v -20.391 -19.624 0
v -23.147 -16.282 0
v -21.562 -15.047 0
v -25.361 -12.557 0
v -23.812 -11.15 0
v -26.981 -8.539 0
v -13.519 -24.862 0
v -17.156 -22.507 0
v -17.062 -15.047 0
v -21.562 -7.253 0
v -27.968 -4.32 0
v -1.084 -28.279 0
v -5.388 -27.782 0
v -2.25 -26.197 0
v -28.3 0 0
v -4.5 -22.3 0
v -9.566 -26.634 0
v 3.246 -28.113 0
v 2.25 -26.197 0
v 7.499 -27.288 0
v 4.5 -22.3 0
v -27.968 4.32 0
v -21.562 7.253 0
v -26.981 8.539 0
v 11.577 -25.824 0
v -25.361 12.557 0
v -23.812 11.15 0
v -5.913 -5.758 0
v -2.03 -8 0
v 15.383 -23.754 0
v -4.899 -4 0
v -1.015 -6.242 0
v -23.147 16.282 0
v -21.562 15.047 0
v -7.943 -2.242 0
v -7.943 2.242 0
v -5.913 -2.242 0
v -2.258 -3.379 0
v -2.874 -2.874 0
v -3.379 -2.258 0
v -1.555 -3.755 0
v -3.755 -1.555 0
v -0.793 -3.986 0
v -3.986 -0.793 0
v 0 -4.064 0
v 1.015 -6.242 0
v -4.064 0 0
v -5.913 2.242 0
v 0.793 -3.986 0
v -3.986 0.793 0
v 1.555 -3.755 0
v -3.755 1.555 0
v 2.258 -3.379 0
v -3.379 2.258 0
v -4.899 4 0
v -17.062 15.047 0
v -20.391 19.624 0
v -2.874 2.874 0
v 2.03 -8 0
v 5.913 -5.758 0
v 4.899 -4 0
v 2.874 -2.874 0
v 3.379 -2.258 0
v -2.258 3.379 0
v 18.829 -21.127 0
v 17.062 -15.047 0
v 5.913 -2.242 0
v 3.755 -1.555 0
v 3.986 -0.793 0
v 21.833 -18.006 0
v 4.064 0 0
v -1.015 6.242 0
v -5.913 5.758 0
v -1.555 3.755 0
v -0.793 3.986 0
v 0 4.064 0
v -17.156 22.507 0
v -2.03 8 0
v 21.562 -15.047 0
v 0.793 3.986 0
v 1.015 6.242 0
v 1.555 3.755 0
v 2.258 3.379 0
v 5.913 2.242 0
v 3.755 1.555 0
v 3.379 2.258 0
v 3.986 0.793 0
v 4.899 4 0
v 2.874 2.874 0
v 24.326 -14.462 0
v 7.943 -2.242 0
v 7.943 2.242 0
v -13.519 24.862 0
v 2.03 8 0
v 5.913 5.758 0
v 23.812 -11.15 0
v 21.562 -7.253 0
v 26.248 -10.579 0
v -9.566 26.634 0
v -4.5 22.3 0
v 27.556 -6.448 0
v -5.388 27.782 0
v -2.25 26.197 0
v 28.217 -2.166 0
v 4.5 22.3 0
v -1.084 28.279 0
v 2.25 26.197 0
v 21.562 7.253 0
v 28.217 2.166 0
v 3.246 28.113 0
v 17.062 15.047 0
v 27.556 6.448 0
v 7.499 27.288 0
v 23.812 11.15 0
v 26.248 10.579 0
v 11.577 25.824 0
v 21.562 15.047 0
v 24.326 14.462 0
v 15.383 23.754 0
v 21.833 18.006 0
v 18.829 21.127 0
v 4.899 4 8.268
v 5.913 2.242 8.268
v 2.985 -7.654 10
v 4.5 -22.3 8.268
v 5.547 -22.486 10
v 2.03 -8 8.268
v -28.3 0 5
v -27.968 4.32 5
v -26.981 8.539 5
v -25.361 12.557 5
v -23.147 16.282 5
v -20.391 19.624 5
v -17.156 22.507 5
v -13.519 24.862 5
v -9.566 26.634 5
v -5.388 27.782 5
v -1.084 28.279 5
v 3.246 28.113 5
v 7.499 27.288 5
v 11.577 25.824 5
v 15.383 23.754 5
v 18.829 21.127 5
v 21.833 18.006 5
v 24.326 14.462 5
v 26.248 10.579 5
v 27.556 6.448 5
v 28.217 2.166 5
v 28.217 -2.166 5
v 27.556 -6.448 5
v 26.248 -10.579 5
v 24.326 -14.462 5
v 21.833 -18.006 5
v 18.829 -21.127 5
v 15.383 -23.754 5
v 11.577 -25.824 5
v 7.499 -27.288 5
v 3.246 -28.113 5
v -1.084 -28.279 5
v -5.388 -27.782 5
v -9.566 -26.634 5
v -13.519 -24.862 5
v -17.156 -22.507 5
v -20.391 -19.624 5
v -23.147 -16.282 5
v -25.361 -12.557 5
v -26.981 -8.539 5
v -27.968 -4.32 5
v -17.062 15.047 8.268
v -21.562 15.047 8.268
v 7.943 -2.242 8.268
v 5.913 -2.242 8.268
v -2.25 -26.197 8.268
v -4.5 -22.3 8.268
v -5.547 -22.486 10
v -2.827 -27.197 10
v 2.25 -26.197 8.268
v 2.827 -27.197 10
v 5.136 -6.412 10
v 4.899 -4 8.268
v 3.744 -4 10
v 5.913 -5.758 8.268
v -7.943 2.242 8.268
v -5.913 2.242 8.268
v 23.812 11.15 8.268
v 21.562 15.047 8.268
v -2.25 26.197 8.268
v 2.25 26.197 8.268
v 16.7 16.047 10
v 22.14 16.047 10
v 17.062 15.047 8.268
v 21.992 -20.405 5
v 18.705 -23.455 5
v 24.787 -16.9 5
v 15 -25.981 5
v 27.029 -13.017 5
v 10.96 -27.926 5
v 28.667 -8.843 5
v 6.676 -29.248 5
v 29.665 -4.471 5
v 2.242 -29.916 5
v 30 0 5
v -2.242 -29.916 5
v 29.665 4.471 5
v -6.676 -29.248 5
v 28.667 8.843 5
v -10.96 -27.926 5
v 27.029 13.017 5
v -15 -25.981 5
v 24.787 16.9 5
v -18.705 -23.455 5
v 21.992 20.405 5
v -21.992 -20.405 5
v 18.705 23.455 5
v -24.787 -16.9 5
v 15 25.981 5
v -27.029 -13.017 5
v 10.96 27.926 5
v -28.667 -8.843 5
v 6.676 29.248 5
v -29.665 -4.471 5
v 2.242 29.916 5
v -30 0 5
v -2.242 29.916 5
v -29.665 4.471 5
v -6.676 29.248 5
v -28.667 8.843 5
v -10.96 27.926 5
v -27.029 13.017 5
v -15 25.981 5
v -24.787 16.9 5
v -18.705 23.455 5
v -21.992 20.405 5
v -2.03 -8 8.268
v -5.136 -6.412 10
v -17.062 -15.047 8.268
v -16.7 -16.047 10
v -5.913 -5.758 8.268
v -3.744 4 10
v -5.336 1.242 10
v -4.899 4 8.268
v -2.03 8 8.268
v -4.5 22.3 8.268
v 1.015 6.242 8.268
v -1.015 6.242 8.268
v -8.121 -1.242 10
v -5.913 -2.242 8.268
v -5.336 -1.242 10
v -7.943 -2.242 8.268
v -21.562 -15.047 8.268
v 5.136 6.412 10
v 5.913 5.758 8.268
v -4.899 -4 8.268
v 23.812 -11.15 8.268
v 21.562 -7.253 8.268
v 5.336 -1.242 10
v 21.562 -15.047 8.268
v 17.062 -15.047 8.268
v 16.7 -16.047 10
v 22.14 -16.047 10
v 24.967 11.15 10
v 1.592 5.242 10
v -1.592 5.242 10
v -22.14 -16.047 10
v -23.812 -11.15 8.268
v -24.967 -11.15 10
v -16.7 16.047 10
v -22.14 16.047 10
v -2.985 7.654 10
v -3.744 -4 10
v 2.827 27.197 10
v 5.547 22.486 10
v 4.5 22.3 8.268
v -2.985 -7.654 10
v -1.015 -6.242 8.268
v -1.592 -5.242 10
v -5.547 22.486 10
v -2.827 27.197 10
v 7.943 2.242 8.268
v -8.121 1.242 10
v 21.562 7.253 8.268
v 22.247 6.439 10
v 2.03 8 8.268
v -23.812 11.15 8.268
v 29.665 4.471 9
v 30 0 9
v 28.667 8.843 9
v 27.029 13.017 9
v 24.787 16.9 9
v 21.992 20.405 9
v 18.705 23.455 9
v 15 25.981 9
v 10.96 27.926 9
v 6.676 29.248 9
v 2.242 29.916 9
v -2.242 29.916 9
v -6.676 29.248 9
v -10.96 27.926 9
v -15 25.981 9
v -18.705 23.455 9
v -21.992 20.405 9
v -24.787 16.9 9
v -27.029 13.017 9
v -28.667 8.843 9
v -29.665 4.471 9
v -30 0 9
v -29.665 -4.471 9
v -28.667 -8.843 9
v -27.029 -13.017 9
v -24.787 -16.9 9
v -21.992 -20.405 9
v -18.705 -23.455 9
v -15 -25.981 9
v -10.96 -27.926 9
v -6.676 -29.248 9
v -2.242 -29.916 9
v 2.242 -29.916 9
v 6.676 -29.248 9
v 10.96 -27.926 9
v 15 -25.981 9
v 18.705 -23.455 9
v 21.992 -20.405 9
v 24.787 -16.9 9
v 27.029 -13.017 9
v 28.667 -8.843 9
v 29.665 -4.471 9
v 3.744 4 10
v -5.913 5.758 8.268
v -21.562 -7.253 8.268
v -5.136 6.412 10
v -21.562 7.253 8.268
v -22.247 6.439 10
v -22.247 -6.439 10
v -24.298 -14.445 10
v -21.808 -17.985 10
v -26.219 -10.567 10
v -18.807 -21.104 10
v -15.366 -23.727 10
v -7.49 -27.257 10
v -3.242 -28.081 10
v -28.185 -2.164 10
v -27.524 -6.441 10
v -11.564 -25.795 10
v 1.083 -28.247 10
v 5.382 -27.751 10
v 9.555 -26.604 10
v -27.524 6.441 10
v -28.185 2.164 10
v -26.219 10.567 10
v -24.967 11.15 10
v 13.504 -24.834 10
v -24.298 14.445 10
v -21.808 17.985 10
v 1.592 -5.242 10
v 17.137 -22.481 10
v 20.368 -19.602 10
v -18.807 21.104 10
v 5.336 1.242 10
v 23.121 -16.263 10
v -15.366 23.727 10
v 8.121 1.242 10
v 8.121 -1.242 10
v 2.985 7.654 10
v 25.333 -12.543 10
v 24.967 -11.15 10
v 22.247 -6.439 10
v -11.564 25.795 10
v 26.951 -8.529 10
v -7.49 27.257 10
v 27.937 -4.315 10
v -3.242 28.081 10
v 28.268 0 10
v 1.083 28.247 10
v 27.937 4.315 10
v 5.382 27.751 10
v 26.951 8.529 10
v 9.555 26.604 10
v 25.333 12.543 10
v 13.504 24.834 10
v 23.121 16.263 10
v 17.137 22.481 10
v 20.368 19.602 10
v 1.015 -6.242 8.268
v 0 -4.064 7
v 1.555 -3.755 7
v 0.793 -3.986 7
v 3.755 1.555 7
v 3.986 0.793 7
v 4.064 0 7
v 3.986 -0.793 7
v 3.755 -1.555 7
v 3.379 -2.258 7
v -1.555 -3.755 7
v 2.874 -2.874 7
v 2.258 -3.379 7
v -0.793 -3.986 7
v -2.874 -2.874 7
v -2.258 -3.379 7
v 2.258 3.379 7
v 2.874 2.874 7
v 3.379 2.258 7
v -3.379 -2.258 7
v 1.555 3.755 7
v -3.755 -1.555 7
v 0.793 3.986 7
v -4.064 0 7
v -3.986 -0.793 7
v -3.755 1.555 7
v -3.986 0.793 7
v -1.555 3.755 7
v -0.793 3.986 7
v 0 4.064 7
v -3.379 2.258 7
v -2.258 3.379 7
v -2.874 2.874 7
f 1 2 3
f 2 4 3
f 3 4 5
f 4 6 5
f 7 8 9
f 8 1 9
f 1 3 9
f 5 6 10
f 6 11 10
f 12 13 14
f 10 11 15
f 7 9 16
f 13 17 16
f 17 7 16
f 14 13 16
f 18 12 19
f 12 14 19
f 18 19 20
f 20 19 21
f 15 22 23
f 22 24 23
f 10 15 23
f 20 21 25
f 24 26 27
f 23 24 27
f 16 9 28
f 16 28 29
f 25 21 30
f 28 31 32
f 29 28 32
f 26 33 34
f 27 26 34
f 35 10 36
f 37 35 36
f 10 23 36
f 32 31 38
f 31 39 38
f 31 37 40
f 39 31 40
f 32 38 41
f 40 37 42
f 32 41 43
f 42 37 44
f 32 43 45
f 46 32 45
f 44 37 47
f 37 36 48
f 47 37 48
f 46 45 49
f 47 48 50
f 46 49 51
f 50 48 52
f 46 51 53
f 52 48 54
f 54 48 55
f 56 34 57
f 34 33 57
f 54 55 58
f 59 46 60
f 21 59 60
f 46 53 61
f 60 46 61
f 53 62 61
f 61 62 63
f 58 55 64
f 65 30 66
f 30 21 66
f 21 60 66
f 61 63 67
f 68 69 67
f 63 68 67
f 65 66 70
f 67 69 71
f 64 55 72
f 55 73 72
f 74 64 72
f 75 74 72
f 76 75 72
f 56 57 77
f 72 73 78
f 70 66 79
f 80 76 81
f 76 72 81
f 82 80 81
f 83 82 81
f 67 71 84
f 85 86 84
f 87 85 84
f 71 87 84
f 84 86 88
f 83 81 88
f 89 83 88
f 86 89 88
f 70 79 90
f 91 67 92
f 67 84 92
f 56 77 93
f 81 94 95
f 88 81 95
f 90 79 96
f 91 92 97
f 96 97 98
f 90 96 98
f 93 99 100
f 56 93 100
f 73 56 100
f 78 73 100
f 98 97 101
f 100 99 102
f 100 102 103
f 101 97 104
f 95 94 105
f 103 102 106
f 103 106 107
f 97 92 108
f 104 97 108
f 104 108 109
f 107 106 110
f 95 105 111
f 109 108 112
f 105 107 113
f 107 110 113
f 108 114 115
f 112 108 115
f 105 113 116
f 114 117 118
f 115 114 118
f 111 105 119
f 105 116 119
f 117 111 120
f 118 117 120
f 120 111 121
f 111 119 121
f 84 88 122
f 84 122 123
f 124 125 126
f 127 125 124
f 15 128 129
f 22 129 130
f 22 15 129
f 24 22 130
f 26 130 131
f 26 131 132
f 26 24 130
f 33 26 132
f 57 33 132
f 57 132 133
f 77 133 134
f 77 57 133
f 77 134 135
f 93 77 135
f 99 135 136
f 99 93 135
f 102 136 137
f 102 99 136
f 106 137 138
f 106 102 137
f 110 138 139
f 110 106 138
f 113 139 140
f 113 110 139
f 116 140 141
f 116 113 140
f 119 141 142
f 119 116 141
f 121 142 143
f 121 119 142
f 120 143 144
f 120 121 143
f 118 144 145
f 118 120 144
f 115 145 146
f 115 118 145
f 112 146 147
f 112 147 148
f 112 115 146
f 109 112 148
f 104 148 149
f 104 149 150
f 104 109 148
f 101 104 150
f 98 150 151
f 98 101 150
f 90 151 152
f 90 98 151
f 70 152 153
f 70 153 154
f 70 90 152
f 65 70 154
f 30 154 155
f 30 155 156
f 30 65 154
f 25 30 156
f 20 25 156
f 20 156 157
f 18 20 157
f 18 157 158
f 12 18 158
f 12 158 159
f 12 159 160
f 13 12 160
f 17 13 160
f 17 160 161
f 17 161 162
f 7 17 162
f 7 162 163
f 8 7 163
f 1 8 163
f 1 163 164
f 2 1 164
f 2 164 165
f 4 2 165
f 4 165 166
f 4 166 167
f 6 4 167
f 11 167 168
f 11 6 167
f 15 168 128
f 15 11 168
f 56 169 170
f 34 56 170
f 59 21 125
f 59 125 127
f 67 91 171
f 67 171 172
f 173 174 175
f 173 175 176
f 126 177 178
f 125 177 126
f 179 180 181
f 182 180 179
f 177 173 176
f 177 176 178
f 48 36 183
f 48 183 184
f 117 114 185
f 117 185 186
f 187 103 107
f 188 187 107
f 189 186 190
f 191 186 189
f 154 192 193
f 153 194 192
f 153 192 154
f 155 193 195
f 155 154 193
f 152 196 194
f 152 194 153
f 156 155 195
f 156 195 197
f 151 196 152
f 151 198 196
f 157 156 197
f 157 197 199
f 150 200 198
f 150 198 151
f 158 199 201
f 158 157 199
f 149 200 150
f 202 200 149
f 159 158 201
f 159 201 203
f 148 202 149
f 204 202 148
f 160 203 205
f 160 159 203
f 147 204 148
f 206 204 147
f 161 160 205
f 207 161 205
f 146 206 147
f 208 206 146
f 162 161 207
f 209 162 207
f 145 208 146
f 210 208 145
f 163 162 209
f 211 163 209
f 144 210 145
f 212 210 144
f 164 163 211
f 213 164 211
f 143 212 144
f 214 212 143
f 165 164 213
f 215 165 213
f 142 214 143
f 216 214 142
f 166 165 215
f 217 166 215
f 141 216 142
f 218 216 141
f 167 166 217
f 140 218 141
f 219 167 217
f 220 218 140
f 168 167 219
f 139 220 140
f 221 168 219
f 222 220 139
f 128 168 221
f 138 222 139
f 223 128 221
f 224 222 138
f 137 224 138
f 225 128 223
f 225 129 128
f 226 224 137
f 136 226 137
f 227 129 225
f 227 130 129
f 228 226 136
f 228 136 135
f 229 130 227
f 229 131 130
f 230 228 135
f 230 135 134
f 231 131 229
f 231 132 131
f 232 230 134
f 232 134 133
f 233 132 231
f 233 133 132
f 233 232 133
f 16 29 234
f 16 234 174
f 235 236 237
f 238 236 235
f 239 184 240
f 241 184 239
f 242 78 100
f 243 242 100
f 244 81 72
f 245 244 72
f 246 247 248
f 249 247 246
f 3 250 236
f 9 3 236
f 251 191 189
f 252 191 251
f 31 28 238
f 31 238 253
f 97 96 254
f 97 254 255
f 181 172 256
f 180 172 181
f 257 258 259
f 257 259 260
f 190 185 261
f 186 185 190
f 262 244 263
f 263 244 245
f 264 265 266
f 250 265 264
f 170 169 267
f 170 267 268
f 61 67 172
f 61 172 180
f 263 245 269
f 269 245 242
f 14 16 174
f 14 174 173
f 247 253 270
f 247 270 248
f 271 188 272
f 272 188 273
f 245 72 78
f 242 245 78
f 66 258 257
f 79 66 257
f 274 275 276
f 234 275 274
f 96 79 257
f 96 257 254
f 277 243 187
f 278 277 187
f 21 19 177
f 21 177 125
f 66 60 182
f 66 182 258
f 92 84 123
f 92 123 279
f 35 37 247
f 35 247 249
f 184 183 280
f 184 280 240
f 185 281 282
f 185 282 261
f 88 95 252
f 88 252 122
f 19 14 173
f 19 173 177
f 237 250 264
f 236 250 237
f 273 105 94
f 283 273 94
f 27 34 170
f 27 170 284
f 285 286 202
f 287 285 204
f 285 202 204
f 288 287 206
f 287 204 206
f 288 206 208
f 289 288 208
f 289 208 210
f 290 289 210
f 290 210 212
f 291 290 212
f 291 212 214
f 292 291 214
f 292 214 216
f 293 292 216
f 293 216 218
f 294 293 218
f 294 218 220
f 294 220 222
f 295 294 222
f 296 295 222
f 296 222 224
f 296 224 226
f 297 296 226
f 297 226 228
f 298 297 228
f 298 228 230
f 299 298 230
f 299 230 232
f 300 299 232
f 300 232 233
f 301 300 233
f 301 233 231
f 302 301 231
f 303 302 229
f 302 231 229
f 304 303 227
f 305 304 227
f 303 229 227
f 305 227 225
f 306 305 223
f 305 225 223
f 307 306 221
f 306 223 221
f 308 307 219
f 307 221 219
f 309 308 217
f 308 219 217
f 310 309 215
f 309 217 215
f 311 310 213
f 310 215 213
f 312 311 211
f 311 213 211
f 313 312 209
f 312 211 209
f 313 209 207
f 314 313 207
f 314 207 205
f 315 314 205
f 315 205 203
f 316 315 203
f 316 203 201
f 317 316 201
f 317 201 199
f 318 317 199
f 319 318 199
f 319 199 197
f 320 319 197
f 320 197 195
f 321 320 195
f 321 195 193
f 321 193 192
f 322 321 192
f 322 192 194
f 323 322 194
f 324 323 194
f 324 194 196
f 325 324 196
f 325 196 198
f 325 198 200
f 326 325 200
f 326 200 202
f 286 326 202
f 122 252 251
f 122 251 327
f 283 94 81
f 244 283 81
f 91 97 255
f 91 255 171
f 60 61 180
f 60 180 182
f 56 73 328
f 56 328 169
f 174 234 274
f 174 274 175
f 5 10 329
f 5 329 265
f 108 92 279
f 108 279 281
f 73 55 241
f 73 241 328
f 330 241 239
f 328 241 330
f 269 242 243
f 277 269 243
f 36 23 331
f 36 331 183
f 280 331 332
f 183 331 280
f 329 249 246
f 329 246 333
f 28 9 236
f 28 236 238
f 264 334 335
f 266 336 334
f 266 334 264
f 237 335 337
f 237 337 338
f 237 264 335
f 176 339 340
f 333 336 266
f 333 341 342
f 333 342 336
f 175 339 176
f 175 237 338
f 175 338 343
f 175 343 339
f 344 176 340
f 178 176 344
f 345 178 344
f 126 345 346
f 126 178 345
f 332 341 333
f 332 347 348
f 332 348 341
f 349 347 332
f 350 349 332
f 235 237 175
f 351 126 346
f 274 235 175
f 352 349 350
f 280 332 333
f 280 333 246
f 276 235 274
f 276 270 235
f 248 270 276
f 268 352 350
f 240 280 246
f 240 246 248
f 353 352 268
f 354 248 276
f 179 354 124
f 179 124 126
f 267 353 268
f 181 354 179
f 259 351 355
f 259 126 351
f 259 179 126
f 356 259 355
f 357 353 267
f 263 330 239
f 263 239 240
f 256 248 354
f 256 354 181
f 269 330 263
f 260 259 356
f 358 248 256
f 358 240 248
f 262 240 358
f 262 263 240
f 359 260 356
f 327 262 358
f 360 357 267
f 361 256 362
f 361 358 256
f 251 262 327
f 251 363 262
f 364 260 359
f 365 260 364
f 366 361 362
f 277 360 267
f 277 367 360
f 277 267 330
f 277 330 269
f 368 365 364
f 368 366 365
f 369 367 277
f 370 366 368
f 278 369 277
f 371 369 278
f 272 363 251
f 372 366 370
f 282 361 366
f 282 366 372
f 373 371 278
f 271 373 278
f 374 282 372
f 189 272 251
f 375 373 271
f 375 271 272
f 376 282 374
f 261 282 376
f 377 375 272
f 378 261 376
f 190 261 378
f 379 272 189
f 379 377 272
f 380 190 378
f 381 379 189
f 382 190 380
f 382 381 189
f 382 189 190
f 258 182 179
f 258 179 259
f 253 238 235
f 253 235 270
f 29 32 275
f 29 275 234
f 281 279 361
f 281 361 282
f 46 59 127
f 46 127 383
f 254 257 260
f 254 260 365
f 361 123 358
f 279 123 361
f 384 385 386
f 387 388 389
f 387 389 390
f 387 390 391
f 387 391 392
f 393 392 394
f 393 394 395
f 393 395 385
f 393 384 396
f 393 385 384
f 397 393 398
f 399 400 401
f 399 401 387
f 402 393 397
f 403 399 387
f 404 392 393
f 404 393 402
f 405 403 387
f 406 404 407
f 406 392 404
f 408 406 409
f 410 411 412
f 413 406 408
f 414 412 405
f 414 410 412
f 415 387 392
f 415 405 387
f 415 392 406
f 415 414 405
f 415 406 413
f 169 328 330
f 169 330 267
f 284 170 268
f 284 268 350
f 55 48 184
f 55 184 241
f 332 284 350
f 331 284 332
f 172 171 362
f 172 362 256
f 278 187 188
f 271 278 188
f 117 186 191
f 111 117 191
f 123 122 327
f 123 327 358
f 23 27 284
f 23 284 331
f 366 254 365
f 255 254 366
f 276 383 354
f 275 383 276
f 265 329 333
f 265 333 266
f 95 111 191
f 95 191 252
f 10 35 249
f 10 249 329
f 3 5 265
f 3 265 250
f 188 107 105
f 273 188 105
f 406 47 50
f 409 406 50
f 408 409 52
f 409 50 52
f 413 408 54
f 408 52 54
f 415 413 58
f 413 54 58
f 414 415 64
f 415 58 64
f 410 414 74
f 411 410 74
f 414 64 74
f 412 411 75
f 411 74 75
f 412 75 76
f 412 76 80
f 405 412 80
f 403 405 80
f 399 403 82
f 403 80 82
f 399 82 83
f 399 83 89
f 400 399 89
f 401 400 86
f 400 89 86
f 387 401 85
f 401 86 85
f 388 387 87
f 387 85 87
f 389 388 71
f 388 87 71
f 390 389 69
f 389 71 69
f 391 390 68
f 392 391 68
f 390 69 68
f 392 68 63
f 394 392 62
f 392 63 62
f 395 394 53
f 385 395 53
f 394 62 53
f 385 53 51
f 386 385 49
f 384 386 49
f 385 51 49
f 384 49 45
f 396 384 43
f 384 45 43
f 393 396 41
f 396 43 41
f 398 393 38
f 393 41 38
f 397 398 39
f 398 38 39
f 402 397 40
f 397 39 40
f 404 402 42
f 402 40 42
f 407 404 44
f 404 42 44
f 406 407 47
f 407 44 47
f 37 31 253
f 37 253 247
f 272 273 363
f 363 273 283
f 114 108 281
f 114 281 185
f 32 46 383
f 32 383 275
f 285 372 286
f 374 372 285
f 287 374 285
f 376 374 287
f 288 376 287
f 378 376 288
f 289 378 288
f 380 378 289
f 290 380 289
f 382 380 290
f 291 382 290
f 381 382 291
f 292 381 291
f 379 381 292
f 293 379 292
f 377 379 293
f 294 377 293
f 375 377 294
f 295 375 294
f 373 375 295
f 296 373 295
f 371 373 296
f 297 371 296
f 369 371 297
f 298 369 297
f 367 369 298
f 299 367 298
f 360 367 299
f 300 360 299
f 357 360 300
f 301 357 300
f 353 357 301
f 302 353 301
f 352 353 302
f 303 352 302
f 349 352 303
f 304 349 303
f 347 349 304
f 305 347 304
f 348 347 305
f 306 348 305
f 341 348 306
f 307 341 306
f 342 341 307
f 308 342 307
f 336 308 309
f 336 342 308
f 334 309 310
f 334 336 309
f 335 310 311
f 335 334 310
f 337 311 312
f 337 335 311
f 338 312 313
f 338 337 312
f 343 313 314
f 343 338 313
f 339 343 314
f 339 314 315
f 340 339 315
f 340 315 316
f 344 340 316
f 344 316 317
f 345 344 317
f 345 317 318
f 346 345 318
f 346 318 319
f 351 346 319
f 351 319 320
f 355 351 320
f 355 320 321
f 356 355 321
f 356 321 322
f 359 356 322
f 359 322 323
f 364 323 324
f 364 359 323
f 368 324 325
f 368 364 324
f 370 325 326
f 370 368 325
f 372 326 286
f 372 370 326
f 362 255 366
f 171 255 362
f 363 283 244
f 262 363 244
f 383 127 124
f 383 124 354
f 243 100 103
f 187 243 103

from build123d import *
from OCP.BRepFilletAPI import BRepFilletAPI_MakeChamfer

# Parameters (mm, degrees)
SKETCH_1_R          = 30
EXTRUDE_1_DEPTH     = 10
SKETCH_3_R          = 4.064215012
CUT_EXTRUDE_1_DEPTH = 7
SKETCH_4_OUTSIDE_W  = 79.088
SKETCH_4_OUTSIDE_H  = 79.088
SKETCH_4_OUTSIDE_R  = 28.3
CUT_EXTRUDE_2_DEPTH = 5
CHAMFER_2_SIZE      = 1
CHAMFER_2_SIZE2     = 1.732050808


with BuildPart() as part:
    # 스케치1 → 보스-돌출1 (new body)
    with BuildSketch(Plane.XY):
        Circle(SKETCH_1_R)
        Polygon((4.5, 22.3), (2.029624384, 8), (1.014812192, 6.242293723), (-1.014812192, 6.242293723), (-2.029624384, 8), (-4.5, 22.3), (-2.25, 26.197114317), (2.25, 26.197114317), align=None, mode=Mode.SUBTRACT)
        Polygon((23.812366504, 11.15), (21.562366504, 15.047114317), (17.062366504, 15.047114317), (5.913391038, 5.757706277), (4.898578846, 4), (5.913391038, 2.242293723), (7.943015422, 2.242293723), (21.562366504, 7.252885683), align=None, mode=Mode.SUBTRACT)
        Polygon((21.562366504, -15.047114317), (23.812366504, -11.15), (21.562366504, -7.252885683), (7.943015422, -2.242293723), (5.913391038, -2.242293723), (4.898578846, -4), (5.913391038, -5.757706277), (17.062366504, -15.047114317), align=None, mode=Mode.SUBTRACT)
        Polygon((-2.25, -26.197114317), (2.25, -26.197114317), (4.5, -22.3), (2.029624384, -8), (1.014812192, -6.242293723), (-1.014812192, -6.242293723), (-2.029624384, -8), (-4.5, -22.3), align=None, mode=Mode.SUBTRACT)
        Polygon((-23.812366504, -11.15), (-21.562366504, -15.047114317), (-17.062366504, -15.047114317), (-5.913391038, -5.757706277), (-4.898578846, -4), (-5.913391038, -2.242293723), (-7.943015422, -2.242293723), (-21.562366504, -7.252885683), align=None, mode=Mode.SUBTRACT)
        Polygon((-21.562366504, 15.047114317), (-23.812366504, 11.15), (-21.562366504, 7.252885683), (-7.943015422, 2.242293723), (-5.913391038, 2.242293723), (-4.898578846, 4), (-5.913391038, 5.757706277), (-17.062366504, 15.047114317), align=None, mode=Mode.SUBTRACT)
    extrude(amount=EXTRUDE_1_DEPTH)

    # 스케치3 → 컷-돌출1 (cut)
    with BuildSketch(Plane(origin=(0, 0, 0), x_dir=(-1, 0, 0), z_dir=(0, 0, -1))):
        Circle(SKETCH_3_R)
    extrude(amount=-CUT_EXTRUDE_1_DEPTH, mode=Mode.SUBTRACT)

    # 스케치4 outside → 컷-돌출2 (cut)
    with BuildSketch(Plane(origin=(0, 0, 0), x_dir=(-1, 0, 0), z_dir=(0, 0, -1))):
        Rectangle(SKETCH_4_OUTSIDE_W, SKETCH_4_OUTSIDE_H)
        Circle(SKETCH_4_OUTSIDE_R, mode=Mode.SUBTRACT)
    extrude(amount=-CUT_EXTRUDE_2_DEPTH, mode=Mode.SUBTRACT)

    # 모따기2: one chamfer whose edges measure the first distance from different faces: ONE call of the kernel's chamfer builder (chamfer() names one face for all edges)
    chamfer_2_edges_1 = [part.edges().sort_by_distance(p)[0] for p in [
        (5.405984942, -3.121146861, 10),
        (1.522218288, -7.121146861, 10),
        (1.522218288, 7.121146861, 10),
        (3.264812192, -15.15, 10),
        (3.375, -24.248557159, 10),
        (0, -26.197114317, 10),
        (-3.375, -24.248557159, 10),
        (-3.264812192, -15.15, 10),
        (-1.522218288, -7.121146861, 10),
        (0, -6.242293723, 10),
        (-5.405984942, -4.878853139, 10),
        (-11.487878771, -10.402410297, 10),
        (-19.312366504, -15.047114317, 10),
        (0, 6.242293723, 10),
        (-22.687366504, -13.098557159, 10),
        (-22.687366504, -9.201442841, 10),
        (-14.752690963, -4.747589703, 10),
        (-6.92820323, -2.242293723, 10),
        (-5.405984942, -3.121146861, 10),
        (-6.92820323, 2.242293723, 10),
        (-14.752690963, 4.747589703, 10),
        (-22.687366504, 9.201442841, 10),
        (-22.687366504, 13.098557159, 10),
        (-19.312366504, 15.047114317, 10),
        (-1.522218288, 7.121146861, 10),
        (-11.487878771, 10.402410297, 10),
        (-5.405984942, 4.878853139, 10),
        (-5.405984942, 3.121146861, 10),
        (-3.264812192, 15.15, 10),
        (-3.375, 24.248557159, 10),
        (0, 26.197114317, 10),
        (3.375, 24.248557159, 10),
        (3.264812192, 15.15, 10),
        (5.405984942, 4.878853139, 10),
        (11.487878771, 10.402410297, 10),
        (19.312366504, 15.047114317, 10),
        (22.687366504, 13.098557159, 10),
        (22.687366504, 9.201442841, 10),
        (14.752690963, 4.747589703, 10),
        (6.92820323, 2.242293723, 10),
        (5.405984942, 3.121146861, 10),
        (6.92820323, -2.242293723, 10),
        (14.752690963, -4.747589703, 10),
        (22.687366504, -9.201442841, 10),
        (22.687366504, -13.098557159, 10),
        (19.312366504, -15.047114317, 10),
        (11.487878771, -10.402410297, 10),
        (5.405984942, -4.878853139, 10),
    ]]
    chamfer_2_side_1 = [part.faces().sort_by_distance(p)[0] for p in [
        (0, 0, 10),
    ]]
    chamfer_2_edges_2 = [part.edges().sort_by_distance(p)[0] for p in [
        (-30, 0, 10),
    ]]
    chamfer_2_side_2 = [part.faces().sort_by_distance(p)[0] for p in [
        (-30, 0, 7.5),
    ]]
    chamfer_2 = BRepFilletAPI_MakeChamfer(part.part.solid().wrapped)
    for e in chamfer_2_edges_1:
        chamfer_2.Add(CHAMFER_2_SIZE, CHAMFER_2_SIZE2, e.wrapped, chamfer_2_side_1[0].wrapped)  # the first distance lies on this face
    for e in chamfer_2_edges_2:
        chamfer_2.Add(CHAMFER_2_SIZE, CHAMFER_2_SIZE2, e.wrapped, chamfer_2_side_2[0].wrapped)  # the first distance lies on this face
    add(Compound.cast(chamfer_2.Shape()), mode=Mode.REPLACE)


solid = part.part
